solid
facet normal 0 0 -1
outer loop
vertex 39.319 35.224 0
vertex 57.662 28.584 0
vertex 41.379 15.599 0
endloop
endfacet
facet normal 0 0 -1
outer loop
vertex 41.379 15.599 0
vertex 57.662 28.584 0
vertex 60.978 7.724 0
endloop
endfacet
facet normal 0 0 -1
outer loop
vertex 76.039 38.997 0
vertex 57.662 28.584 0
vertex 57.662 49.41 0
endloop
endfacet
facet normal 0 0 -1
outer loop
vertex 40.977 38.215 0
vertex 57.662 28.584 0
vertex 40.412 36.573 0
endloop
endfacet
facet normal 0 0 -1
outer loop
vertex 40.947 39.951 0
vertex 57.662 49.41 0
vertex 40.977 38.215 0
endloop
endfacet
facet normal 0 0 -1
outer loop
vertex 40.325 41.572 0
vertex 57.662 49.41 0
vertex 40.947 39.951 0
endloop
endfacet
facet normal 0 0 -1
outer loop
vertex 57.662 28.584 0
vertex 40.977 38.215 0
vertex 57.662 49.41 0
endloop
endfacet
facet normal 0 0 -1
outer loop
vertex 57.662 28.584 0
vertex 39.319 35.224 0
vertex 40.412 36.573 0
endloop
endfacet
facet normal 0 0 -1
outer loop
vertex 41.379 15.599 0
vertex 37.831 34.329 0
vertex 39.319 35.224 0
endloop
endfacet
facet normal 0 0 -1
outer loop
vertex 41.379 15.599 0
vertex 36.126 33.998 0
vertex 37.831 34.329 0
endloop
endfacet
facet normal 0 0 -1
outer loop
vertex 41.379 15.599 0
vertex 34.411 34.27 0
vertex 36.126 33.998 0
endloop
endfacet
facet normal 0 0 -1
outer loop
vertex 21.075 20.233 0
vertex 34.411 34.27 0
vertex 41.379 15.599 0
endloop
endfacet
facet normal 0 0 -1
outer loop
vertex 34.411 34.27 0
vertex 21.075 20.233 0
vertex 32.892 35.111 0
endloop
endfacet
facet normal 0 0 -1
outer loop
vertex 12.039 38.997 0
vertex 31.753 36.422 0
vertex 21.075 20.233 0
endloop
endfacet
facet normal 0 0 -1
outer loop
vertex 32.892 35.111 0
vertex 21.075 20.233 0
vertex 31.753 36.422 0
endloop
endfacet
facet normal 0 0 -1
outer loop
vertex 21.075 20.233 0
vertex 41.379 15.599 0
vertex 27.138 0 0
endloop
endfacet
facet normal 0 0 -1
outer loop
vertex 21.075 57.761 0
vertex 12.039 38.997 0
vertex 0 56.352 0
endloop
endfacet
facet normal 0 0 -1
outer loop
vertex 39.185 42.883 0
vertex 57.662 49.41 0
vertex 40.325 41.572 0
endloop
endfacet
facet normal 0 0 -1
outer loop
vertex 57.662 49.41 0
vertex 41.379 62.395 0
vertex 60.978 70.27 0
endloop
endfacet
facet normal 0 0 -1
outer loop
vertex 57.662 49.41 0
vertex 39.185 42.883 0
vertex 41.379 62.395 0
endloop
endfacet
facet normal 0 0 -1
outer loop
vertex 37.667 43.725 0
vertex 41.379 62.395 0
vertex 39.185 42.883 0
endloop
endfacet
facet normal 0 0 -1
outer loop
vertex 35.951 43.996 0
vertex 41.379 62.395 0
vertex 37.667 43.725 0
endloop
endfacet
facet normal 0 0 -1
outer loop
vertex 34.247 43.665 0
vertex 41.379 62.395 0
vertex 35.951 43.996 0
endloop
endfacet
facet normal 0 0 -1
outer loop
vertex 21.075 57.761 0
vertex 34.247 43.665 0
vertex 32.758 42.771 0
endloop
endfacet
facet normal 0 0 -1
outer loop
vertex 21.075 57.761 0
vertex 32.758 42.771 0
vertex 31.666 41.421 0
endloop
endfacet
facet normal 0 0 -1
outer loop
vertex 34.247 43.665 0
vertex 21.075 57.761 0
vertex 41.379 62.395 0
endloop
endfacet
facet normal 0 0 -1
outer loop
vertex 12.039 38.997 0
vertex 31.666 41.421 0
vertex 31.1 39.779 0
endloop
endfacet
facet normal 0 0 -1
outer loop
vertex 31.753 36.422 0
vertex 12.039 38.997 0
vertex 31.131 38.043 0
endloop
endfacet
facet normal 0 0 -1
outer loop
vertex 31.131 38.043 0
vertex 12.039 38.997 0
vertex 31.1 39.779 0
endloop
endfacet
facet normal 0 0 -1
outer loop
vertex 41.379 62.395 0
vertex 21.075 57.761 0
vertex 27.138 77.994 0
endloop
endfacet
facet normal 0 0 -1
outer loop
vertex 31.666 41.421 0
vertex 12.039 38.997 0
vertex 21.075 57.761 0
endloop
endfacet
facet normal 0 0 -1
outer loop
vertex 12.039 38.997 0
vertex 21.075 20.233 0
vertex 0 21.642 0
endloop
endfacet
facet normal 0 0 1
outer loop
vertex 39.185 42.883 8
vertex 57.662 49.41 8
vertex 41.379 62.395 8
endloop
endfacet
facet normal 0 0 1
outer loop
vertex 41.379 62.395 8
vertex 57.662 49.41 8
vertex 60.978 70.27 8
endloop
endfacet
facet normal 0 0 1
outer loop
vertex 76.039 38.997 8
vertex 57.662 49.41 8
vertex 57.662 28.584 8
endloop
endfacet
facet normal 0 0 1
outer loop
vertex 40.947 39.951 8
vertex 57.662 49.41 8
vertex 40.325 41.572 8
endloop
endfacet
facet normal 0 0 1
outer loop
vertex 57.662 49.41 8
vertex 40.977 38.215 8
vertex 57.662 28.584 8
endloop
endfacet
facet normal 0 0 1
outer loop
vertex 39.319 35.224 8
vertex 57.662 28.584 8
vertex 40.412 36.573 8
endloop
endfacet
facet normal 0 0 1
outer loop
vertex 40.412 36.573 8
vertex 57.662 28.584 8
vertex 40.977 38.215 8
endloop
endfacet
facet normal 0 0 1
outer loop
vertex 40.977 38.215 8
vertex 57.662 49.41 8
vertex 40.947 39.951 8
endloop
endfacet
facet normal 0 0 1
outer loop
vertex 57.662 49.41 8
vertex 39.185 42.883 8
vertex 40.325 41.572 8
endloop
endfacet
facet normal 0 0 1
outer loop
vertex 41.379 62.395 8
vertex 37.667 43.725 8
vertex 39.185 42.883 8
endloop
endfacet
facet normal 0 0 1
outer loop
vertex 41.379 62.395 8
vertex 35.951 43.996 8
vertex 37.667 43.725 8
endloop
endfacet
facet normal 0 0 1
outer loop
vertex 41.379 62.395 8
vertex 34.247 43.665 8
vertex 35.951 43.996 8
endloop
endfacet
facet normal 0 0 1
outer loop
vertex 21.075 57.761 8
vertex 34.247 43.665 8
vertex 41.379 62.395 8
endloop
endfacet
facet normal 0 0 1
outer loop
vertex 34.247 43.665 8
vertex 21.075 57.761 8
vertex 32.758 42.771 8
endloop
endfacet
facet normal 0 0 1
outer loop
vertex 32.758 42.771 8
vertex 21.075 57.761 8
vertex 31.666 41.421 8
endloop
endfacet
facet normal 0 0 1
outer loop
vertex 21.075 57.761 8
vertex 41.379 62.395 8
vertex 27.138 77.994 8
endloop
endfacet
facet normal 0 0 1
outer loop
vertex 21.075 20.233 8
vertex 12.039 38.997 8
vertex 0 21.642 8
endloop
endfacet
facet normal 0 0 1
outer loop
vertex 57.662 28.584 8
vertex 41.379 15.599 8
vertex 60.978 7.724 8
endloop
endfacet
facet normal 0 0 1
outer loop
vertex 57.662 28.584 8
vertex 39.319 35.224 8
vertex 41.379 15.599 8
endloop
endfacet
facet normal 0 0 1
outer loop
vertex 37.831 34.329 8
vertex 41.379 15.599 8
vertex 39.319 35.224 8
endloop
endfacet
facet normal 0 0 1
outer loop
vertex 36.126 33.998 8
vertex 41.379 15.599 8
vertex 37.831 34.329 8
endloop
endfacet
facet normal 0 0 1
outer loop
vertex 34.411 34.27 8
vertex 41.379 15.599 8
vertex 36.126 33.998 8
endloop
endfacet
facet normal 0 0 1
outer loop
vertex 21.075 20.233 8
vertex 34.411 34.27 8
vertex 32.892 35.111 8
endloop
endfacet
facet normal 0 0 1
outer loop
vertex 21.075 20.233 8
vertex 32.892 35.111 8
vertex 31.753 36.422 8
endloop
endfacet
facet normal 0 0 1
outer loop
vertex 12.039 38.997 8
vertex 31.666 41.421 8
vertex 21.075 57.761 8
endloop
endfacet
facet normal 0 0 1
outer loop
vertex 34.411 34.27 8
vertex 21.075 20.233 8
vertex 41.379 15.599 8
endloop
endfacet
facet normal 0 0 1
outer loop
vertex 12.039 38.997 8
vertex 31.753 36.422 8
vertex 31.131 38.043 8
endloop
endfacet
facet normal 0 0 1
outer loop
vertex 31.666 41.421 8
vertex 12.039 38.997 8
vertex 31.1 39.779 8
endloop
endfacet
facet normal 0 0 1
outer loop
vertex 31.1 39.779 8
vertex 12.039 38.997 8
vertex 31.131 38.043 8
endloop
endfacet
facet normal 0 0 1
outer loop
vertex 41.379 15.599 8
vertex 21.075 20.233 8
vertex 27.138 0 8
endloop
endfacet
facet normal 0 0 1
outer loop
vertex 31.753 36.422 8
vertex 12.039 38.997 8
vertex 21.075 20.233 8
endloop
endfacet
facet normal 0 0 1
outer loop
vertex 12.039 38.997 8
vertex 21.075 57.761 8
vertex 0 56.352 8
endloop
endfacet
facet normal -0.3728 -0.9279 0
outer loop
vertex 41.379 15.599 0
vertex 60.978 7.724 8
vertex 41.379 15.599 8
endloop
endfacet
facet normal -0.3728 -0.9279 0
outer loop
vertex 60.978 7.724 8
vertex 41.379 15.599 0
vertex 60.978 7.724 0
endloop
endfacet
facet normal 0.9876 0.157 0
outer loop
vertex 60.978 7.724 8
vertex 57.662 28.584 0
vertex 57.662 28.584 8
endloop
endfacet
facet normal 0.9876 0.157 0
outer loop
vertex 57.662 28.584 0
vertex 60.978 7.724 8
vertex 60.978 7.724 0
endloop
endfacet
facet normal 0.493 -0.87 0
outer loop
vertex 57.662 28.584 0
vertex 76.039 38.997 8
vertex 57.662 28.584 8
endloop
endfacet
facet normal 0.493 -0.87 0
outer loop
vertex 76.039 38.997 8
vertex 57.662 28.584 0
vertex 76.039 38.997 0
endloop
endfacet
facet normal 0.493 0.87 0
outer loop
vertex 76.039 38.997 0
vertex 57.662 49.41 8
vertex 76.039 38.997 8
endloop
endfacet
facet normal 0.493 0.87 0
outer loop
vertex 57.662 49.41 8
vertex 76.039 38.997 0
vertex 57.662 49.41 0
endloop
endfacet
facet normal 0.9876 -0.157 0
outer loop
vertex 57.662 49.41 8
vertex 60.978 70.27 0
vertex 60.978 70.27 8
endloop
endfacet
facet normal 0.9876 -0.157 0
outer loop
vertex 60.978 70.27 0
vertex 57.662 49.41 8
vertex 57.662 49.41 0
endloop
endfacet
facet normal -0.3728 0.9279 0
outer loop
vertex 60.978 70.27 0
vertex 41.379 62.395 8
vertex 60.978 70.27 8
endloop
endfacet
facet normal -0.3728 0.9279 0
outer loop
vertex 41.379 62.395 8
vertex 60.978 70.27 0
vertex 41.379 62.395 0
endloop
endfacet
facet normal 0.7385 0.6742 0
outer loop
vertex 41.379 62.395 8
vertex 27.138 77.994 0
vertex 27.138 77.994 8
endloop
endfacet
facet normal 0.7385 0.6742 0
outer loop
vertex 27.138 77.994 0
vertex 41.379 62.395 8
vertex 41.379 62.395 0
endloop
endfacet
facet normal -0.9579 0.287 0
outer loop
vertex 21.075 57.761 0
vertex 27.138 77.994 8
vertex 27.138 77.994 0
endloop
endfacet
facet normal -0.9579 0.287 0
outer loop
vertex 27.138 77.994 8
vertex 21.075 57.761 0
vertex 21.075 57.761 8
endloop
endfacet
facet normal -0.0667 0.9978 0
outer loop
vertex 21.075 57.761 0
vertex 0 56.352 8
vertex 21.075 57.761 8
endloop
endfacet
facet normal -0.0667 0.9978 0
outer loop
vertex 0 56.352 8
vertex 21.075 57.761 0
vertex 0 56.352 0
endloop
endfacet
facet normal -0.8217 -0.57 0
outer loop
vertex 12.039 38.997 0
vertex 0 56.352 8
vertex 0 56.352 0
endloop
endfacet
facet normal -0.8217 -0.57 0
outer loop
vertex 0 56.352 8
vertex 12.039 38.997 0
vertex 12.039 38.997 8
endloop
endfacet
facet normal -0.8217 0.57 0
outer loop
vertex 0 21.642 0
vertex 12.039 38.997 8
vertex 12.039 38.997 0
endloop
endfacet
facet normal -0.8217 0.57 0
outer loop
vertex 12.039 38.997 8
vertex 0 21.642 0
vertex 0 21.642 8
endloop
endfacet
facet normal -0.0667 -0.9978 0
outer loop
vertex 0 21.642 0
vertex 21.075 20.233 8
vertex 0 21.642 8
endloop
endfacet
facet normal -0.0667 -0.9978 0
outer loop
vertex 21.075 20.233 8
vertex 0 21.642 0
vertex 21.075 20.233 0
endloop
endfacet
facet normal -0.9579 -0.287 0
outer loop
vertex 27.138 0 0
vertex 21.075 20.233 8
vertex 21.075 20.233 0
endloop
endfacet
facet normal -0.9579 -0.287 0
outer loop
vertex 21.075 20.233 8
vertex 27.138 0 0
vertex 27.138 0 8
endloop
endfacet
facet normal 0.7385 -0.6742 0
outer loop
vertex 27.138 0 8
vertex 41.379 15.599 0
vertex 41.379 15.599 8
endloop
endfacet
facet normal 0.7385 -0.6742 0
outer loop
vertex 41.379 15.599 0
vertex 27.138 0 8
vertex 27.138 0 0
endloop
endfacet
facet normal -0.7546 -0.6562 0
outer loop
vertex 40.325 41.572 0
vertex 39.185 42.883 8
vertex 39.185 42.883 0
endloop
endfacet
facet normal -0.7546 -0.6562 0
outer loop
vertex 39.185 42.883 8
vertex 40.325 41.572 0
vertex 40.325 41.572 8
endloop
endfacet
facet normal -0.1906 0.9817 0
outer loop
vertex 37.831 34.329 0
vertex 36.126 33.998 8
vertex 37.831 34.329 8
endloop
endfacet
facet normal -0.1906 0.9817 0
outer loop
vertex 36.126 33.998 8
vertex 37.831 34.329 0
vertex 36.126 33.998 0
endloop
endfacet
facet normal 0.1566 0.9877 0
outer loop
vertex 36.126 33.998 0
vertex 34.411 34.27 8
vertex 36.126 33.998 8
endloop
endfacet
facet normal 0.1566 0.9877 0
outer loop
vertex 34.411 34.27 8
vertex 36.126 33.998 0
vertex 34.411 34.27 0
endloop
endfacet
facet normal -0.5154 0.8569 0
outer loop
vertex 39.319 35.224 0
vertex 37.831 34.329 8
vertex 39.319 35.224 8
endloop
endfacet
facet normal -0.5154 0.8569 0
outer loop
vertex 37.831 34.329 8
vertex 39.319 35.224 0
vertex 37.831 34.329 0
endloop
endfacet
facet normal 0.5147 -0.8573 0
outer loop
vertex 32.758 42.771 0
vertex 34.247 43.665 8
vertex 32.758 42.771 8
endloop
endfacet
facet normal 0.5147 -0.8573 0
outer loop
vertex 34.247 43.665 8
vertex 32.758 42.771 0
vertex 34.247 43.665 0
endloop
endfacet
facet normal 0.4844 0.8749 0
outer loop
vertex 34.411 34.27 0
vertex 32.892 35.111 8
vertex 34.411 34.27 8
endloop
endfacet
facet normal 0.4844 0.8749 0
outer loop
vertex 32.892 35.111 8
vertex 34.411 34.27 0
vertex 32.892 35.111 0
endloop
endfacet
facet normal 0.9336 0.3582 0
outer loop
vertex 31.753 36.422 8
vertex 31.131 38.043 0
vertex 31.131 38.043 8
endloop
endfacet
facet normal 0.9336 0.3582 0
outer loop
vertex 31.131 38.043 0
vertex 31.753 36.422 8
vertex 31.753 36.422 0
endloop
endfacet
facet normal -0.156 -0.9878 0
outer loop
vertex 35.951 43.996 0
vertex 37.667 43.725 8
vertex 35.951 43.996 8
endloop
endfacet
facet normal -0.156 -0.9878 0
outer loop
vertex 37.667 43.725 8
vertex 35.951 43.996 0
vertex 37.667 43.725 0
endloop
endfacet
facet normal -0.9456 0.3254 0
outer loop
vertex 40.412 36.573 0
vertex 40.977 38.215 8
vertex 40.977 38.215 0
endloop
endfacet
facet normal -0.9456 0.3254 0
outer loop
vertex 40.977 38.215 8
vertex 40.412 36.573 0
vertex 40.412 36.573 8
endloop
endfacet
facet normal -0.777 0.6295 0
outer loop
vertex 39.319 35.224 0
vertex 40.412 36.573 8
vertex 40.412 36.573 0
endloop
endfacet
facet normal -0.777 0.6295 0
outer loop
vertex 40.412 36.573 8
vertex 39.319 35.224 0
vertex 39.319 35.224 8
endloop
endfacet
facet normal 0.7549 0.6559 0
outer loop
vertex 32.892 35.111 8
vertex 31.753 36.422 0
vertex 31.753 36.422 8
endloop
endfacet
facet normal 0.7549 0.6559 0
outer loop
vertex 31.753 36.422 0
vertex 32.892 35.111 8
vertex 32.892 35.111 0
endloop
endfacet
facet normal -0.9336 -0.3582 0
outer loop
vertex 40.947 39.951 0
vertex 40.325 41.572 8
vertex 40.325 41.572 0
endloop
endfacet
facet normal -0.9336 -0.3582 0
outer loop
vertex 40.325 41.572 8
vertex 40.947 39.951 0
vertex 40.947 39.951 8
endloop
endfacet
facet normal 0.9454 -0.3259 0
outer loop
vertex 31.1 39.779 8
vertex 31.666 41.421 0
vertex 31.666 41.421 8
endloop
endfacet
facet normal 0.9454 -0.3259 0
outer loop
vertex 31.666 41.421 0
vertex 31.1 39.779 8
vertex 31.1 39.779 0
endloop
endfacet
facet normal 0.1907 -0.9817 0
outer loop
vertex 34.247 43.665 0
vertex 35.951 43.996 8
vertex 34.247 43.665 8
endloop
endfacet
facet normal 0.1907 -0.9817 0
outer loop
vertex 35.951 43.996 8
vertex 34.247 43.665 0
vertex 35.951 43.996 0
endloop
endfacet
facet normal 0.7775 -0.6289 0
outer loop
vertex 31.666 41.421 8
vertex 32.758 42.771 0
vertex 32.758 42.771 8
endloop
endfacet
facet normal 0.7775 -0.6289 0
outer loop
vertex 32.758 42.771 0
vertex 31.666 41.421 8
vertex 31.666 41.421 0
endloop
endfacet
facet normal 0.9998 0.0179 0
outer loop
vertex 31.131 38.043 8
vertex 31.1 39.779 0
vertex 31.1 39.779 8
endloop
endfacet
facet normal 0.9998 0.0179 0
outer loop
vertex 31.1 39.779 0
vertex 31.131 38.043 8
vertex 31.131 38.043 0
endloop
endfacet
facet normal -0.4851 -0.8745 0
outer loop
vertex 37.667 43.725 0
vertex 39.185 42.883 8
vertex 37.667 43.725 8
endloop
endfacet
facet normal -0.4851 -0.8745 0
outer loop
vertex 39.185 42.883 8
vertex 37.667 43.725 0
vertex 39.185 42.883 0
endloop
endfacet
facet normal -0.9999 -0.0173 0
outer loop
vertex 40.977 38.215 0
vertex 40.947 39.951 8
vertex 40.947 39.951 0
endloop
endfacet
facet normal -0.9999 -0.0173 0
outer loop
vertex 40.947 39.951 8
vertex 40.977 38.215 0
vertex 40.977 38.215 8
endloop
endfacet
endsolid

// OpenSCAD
$fn = 32;

// ----------------------------------------------------------------------
// Star wheel: 7-point blunt, R40
// ----------------------------------------------------------------------

// --- parameters (mm) ---
n_points = 7;             // number of points / teeth
r_out = 40;               // tip radius
r_in = 24;                // root radius
bore_r = 5;               // centre bore radius
plate_t = 8;              // plate thickness, Z (extrusion height)
bore_d = 10;              // centre bore diameter

profile = [[76.039, 38.997], [57.662, 49.41], [60.978, 70.27], [41.379, 62.395], [27.138, 77.994], [21.075, 57.761], [0, 56.352], [12.039, 38.997], [0, 21.642], [21.075, 20.233], [27.138, 0], [41.379, 15.599], [60.978, 7.724], [57.662, 28.584]];  // primary outline, 14 points, counter clockwise
void_1 = [[40.947, 39.951], [40.325, 41.572], [39.185, 42.883], [37.667, 43.725], [35.951, 43.996], [34.247, 43.665], [32.758, 42.771], [31.666, 41.421], [31.1, 39.779], [31.131, 38.043], [31.753, 36.422], [32.892, 35.111], [34.411, 34.27], [36.126, 33.998], [37.831, 34.329], [39.319, 35.224], [40.412, 36.573], [40.977, 38.215]];  // centre bore, 18 points

// --- the one profile operation ---
difference() {
  linear_extrude(height = plate_t) polygon(points = profile);
  translate([0, 0, -1])
    linear_extrude(height = plate_t + 2) polygon(points = void_1);
}
